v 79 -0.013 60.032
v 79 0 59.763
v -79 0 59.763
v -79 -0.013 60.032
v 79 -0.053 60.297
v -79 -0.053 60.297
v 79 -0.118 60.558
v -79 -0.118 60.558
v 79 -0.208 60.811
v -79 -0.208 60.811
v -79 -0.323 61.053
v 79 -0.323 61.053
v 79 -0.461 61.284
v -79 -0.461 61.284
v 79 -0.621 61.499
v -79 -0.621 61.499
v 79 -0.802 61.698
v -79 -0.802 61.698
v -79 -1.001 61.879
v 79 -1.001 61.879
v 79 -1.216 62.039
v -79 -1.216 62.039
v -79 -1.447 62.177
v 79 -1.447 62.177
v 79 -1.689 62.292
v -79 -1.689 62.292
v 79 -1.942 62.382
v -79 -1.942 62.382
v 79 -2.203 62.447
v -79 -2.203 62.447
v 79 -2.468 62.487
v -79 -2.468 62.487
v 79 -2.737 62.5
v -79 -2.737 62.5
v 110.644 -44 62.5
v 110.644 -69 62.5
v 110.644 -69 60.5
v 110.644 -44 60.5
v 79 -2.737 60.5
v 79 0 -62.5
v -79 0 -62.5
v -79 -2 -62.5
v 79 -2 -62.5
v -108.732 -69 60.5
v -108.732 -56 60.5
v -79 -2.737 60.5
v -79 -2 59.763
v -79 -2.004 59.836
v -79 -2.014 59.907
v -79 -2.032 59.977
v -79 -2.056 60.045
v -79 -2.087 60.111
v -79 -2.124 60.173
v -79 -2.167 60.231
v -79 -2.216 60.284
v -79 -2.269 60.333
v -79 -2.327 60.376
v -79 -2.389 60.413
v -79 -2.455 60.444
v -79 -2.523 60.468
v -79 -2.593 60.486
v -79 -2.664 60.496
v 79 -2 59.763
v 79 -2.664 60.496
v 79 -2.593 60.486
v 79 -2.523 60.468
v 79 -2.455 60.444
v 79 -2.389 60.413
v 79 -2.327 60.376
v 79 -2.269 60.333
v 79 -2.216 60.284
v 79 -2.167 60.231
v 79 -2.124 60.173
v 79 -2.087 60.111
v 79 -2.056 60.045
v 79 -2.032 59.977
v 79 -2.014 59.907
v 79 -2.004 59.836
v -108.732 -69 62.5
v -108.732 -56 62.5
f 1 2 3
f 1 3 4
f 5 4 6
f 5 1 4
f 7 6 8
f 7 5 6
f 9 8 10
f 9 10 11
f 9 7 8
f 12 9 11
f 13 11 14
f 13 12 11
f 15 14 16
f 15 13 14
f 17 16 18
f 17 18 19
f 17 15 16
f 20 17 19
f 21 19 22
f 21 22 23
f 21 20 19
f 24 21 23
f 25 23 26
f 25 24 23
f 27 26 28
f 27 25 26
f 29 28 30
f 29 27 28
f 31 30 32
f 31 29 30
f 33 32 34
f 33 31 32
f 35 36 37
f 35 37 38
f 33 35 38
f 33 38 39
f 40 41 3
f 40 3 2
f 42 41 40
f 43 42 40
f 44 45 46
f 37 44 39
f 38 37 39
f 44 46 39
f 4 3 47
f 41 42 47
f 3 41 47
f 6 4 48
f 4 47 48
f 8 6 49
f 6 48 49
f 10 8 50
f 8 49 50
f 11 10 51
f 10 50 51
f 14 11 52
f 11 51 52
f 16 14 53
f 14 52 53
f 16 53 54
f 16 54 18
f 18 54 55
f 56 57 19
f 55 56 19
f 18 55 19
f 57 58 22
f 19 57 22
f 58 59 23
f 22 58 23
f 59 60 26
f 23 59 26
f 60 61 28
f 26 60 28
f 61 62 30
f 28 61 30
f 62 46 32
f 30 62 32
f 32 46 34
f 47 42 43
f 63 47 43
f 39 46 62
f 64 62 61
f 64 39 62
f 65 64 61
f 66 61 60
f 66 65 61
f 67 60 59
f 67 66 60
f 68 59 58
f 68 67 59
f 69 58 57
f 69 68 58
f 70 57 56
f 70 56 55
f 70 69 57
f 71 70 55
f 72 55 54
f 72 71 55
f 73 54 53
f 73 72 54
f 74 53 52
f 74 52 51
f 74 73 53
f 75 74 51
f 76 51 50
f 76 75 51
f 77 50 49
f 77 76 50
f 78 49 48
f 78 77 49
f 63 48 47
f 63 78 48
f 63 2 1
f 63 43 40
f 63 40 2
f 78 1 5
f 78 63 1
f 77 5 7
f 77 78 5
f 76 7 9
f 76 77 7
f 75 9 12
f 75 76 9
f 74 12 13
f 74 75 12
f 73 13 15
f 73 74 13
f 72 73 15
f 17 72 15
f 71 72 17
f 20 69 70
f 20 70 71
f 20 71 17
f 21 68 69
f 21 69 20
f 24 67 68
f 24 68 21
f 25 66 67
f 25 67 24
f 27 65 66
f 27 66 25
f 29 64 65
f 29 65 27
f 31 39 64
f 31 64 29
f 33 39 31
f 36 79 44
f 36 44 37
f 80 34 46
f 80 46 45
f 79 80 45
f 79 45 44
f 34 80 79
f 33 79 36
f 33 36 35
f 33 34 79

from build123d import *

# Parameters (mm, degrees)
SKETCH_1_W                       = 158
SKETCH_1_H                       = 125
SM_BASE_FLANGE_1_DEPTH           = 2
SM_EDGE_FLANGE_1_STRIP_W         = 9.4732
SM_EDGE_FLANGE_1_STRIP_H         = 2
SM_EDGE_FLANGE_1_STRIP_CUT_DEPTH = 158
SM_EDGE_FLANGE_1_DEPTH           = 158
SM_BASE_FLANGE_1_2_DEPTH         = 2


# Sheet-metal steps are written as plain solids
with BuildPart() as part:
    # Sketch 1 → Sm Base Flange 1 (new body)
    with BuildSketch(Plane(origin=(0, 0, 0), x_dir=(1, 0, 0), z_dir=(0, 1, 0))):
        Rectangle(SKETCH_1_W, SKETCH_1_H)
    extrude(amount=-SM_BASE_FLANGE_1_DEPTH)

    # 边线-法兰1 strip (across the edge) → 边线-法兰1 strip cut (cut)
    with BuildSketch(Plane(origin=(79, -2, 62.5), x_dir=(0, 0, -1), z_dir=(-1, 0, 0))):
        with Locations((-2, -1)):
            Rectangle(SM_EDGE_FLANGE_1_STRIP_W, SM_EDGE_FLANGE_1_STRIP_H)
    extrude(amount=SM_EDGE_FLANGE_1_STRIP_CUT_DEPTH, mode=Mode.SUBTRACT)

    # 边线-法兰1 section (across the edge) → 边线-法兰1 (add)
    with BuildSketch(Plane(origin=(79, -2, 62.5), x_dir=(0, 0, -1), z_dir=(-1, 0, 0))):
        with BuildLine():
            Line((0, 0.7366), (0, 67))
            Line((0, 67), (2, 67))
            Line((2, 67), (2, 0.7366))
            ThreePointArc((2, 0.7366), (2.215745145, 0.215745145), (2.7366, 0))
            Line((2.7366, 0), (2.7366, -2))
            ThreePointArc((2.7366, -2), (0.801531583, -1.198468417), (0, 0.7366))
        make_face()
    extrude(amount=SM_EDGE_FLANGE_1_DEPTH)

    # 草图9 → Sm Base Flange 1 2 (add)
    with BuildSketch(Plane.XY.offset(62.5)):
        Polygon((-79, -2.7366), (-108.732309369, -56), (-108.732309369, -69), (110.643827525, -69), (110.643827525, -44), (79, -2.7366), align=None)
    extrude(amount=-SM_BASE_FLANGE_1_2_DEPTH)


solid = part.part
